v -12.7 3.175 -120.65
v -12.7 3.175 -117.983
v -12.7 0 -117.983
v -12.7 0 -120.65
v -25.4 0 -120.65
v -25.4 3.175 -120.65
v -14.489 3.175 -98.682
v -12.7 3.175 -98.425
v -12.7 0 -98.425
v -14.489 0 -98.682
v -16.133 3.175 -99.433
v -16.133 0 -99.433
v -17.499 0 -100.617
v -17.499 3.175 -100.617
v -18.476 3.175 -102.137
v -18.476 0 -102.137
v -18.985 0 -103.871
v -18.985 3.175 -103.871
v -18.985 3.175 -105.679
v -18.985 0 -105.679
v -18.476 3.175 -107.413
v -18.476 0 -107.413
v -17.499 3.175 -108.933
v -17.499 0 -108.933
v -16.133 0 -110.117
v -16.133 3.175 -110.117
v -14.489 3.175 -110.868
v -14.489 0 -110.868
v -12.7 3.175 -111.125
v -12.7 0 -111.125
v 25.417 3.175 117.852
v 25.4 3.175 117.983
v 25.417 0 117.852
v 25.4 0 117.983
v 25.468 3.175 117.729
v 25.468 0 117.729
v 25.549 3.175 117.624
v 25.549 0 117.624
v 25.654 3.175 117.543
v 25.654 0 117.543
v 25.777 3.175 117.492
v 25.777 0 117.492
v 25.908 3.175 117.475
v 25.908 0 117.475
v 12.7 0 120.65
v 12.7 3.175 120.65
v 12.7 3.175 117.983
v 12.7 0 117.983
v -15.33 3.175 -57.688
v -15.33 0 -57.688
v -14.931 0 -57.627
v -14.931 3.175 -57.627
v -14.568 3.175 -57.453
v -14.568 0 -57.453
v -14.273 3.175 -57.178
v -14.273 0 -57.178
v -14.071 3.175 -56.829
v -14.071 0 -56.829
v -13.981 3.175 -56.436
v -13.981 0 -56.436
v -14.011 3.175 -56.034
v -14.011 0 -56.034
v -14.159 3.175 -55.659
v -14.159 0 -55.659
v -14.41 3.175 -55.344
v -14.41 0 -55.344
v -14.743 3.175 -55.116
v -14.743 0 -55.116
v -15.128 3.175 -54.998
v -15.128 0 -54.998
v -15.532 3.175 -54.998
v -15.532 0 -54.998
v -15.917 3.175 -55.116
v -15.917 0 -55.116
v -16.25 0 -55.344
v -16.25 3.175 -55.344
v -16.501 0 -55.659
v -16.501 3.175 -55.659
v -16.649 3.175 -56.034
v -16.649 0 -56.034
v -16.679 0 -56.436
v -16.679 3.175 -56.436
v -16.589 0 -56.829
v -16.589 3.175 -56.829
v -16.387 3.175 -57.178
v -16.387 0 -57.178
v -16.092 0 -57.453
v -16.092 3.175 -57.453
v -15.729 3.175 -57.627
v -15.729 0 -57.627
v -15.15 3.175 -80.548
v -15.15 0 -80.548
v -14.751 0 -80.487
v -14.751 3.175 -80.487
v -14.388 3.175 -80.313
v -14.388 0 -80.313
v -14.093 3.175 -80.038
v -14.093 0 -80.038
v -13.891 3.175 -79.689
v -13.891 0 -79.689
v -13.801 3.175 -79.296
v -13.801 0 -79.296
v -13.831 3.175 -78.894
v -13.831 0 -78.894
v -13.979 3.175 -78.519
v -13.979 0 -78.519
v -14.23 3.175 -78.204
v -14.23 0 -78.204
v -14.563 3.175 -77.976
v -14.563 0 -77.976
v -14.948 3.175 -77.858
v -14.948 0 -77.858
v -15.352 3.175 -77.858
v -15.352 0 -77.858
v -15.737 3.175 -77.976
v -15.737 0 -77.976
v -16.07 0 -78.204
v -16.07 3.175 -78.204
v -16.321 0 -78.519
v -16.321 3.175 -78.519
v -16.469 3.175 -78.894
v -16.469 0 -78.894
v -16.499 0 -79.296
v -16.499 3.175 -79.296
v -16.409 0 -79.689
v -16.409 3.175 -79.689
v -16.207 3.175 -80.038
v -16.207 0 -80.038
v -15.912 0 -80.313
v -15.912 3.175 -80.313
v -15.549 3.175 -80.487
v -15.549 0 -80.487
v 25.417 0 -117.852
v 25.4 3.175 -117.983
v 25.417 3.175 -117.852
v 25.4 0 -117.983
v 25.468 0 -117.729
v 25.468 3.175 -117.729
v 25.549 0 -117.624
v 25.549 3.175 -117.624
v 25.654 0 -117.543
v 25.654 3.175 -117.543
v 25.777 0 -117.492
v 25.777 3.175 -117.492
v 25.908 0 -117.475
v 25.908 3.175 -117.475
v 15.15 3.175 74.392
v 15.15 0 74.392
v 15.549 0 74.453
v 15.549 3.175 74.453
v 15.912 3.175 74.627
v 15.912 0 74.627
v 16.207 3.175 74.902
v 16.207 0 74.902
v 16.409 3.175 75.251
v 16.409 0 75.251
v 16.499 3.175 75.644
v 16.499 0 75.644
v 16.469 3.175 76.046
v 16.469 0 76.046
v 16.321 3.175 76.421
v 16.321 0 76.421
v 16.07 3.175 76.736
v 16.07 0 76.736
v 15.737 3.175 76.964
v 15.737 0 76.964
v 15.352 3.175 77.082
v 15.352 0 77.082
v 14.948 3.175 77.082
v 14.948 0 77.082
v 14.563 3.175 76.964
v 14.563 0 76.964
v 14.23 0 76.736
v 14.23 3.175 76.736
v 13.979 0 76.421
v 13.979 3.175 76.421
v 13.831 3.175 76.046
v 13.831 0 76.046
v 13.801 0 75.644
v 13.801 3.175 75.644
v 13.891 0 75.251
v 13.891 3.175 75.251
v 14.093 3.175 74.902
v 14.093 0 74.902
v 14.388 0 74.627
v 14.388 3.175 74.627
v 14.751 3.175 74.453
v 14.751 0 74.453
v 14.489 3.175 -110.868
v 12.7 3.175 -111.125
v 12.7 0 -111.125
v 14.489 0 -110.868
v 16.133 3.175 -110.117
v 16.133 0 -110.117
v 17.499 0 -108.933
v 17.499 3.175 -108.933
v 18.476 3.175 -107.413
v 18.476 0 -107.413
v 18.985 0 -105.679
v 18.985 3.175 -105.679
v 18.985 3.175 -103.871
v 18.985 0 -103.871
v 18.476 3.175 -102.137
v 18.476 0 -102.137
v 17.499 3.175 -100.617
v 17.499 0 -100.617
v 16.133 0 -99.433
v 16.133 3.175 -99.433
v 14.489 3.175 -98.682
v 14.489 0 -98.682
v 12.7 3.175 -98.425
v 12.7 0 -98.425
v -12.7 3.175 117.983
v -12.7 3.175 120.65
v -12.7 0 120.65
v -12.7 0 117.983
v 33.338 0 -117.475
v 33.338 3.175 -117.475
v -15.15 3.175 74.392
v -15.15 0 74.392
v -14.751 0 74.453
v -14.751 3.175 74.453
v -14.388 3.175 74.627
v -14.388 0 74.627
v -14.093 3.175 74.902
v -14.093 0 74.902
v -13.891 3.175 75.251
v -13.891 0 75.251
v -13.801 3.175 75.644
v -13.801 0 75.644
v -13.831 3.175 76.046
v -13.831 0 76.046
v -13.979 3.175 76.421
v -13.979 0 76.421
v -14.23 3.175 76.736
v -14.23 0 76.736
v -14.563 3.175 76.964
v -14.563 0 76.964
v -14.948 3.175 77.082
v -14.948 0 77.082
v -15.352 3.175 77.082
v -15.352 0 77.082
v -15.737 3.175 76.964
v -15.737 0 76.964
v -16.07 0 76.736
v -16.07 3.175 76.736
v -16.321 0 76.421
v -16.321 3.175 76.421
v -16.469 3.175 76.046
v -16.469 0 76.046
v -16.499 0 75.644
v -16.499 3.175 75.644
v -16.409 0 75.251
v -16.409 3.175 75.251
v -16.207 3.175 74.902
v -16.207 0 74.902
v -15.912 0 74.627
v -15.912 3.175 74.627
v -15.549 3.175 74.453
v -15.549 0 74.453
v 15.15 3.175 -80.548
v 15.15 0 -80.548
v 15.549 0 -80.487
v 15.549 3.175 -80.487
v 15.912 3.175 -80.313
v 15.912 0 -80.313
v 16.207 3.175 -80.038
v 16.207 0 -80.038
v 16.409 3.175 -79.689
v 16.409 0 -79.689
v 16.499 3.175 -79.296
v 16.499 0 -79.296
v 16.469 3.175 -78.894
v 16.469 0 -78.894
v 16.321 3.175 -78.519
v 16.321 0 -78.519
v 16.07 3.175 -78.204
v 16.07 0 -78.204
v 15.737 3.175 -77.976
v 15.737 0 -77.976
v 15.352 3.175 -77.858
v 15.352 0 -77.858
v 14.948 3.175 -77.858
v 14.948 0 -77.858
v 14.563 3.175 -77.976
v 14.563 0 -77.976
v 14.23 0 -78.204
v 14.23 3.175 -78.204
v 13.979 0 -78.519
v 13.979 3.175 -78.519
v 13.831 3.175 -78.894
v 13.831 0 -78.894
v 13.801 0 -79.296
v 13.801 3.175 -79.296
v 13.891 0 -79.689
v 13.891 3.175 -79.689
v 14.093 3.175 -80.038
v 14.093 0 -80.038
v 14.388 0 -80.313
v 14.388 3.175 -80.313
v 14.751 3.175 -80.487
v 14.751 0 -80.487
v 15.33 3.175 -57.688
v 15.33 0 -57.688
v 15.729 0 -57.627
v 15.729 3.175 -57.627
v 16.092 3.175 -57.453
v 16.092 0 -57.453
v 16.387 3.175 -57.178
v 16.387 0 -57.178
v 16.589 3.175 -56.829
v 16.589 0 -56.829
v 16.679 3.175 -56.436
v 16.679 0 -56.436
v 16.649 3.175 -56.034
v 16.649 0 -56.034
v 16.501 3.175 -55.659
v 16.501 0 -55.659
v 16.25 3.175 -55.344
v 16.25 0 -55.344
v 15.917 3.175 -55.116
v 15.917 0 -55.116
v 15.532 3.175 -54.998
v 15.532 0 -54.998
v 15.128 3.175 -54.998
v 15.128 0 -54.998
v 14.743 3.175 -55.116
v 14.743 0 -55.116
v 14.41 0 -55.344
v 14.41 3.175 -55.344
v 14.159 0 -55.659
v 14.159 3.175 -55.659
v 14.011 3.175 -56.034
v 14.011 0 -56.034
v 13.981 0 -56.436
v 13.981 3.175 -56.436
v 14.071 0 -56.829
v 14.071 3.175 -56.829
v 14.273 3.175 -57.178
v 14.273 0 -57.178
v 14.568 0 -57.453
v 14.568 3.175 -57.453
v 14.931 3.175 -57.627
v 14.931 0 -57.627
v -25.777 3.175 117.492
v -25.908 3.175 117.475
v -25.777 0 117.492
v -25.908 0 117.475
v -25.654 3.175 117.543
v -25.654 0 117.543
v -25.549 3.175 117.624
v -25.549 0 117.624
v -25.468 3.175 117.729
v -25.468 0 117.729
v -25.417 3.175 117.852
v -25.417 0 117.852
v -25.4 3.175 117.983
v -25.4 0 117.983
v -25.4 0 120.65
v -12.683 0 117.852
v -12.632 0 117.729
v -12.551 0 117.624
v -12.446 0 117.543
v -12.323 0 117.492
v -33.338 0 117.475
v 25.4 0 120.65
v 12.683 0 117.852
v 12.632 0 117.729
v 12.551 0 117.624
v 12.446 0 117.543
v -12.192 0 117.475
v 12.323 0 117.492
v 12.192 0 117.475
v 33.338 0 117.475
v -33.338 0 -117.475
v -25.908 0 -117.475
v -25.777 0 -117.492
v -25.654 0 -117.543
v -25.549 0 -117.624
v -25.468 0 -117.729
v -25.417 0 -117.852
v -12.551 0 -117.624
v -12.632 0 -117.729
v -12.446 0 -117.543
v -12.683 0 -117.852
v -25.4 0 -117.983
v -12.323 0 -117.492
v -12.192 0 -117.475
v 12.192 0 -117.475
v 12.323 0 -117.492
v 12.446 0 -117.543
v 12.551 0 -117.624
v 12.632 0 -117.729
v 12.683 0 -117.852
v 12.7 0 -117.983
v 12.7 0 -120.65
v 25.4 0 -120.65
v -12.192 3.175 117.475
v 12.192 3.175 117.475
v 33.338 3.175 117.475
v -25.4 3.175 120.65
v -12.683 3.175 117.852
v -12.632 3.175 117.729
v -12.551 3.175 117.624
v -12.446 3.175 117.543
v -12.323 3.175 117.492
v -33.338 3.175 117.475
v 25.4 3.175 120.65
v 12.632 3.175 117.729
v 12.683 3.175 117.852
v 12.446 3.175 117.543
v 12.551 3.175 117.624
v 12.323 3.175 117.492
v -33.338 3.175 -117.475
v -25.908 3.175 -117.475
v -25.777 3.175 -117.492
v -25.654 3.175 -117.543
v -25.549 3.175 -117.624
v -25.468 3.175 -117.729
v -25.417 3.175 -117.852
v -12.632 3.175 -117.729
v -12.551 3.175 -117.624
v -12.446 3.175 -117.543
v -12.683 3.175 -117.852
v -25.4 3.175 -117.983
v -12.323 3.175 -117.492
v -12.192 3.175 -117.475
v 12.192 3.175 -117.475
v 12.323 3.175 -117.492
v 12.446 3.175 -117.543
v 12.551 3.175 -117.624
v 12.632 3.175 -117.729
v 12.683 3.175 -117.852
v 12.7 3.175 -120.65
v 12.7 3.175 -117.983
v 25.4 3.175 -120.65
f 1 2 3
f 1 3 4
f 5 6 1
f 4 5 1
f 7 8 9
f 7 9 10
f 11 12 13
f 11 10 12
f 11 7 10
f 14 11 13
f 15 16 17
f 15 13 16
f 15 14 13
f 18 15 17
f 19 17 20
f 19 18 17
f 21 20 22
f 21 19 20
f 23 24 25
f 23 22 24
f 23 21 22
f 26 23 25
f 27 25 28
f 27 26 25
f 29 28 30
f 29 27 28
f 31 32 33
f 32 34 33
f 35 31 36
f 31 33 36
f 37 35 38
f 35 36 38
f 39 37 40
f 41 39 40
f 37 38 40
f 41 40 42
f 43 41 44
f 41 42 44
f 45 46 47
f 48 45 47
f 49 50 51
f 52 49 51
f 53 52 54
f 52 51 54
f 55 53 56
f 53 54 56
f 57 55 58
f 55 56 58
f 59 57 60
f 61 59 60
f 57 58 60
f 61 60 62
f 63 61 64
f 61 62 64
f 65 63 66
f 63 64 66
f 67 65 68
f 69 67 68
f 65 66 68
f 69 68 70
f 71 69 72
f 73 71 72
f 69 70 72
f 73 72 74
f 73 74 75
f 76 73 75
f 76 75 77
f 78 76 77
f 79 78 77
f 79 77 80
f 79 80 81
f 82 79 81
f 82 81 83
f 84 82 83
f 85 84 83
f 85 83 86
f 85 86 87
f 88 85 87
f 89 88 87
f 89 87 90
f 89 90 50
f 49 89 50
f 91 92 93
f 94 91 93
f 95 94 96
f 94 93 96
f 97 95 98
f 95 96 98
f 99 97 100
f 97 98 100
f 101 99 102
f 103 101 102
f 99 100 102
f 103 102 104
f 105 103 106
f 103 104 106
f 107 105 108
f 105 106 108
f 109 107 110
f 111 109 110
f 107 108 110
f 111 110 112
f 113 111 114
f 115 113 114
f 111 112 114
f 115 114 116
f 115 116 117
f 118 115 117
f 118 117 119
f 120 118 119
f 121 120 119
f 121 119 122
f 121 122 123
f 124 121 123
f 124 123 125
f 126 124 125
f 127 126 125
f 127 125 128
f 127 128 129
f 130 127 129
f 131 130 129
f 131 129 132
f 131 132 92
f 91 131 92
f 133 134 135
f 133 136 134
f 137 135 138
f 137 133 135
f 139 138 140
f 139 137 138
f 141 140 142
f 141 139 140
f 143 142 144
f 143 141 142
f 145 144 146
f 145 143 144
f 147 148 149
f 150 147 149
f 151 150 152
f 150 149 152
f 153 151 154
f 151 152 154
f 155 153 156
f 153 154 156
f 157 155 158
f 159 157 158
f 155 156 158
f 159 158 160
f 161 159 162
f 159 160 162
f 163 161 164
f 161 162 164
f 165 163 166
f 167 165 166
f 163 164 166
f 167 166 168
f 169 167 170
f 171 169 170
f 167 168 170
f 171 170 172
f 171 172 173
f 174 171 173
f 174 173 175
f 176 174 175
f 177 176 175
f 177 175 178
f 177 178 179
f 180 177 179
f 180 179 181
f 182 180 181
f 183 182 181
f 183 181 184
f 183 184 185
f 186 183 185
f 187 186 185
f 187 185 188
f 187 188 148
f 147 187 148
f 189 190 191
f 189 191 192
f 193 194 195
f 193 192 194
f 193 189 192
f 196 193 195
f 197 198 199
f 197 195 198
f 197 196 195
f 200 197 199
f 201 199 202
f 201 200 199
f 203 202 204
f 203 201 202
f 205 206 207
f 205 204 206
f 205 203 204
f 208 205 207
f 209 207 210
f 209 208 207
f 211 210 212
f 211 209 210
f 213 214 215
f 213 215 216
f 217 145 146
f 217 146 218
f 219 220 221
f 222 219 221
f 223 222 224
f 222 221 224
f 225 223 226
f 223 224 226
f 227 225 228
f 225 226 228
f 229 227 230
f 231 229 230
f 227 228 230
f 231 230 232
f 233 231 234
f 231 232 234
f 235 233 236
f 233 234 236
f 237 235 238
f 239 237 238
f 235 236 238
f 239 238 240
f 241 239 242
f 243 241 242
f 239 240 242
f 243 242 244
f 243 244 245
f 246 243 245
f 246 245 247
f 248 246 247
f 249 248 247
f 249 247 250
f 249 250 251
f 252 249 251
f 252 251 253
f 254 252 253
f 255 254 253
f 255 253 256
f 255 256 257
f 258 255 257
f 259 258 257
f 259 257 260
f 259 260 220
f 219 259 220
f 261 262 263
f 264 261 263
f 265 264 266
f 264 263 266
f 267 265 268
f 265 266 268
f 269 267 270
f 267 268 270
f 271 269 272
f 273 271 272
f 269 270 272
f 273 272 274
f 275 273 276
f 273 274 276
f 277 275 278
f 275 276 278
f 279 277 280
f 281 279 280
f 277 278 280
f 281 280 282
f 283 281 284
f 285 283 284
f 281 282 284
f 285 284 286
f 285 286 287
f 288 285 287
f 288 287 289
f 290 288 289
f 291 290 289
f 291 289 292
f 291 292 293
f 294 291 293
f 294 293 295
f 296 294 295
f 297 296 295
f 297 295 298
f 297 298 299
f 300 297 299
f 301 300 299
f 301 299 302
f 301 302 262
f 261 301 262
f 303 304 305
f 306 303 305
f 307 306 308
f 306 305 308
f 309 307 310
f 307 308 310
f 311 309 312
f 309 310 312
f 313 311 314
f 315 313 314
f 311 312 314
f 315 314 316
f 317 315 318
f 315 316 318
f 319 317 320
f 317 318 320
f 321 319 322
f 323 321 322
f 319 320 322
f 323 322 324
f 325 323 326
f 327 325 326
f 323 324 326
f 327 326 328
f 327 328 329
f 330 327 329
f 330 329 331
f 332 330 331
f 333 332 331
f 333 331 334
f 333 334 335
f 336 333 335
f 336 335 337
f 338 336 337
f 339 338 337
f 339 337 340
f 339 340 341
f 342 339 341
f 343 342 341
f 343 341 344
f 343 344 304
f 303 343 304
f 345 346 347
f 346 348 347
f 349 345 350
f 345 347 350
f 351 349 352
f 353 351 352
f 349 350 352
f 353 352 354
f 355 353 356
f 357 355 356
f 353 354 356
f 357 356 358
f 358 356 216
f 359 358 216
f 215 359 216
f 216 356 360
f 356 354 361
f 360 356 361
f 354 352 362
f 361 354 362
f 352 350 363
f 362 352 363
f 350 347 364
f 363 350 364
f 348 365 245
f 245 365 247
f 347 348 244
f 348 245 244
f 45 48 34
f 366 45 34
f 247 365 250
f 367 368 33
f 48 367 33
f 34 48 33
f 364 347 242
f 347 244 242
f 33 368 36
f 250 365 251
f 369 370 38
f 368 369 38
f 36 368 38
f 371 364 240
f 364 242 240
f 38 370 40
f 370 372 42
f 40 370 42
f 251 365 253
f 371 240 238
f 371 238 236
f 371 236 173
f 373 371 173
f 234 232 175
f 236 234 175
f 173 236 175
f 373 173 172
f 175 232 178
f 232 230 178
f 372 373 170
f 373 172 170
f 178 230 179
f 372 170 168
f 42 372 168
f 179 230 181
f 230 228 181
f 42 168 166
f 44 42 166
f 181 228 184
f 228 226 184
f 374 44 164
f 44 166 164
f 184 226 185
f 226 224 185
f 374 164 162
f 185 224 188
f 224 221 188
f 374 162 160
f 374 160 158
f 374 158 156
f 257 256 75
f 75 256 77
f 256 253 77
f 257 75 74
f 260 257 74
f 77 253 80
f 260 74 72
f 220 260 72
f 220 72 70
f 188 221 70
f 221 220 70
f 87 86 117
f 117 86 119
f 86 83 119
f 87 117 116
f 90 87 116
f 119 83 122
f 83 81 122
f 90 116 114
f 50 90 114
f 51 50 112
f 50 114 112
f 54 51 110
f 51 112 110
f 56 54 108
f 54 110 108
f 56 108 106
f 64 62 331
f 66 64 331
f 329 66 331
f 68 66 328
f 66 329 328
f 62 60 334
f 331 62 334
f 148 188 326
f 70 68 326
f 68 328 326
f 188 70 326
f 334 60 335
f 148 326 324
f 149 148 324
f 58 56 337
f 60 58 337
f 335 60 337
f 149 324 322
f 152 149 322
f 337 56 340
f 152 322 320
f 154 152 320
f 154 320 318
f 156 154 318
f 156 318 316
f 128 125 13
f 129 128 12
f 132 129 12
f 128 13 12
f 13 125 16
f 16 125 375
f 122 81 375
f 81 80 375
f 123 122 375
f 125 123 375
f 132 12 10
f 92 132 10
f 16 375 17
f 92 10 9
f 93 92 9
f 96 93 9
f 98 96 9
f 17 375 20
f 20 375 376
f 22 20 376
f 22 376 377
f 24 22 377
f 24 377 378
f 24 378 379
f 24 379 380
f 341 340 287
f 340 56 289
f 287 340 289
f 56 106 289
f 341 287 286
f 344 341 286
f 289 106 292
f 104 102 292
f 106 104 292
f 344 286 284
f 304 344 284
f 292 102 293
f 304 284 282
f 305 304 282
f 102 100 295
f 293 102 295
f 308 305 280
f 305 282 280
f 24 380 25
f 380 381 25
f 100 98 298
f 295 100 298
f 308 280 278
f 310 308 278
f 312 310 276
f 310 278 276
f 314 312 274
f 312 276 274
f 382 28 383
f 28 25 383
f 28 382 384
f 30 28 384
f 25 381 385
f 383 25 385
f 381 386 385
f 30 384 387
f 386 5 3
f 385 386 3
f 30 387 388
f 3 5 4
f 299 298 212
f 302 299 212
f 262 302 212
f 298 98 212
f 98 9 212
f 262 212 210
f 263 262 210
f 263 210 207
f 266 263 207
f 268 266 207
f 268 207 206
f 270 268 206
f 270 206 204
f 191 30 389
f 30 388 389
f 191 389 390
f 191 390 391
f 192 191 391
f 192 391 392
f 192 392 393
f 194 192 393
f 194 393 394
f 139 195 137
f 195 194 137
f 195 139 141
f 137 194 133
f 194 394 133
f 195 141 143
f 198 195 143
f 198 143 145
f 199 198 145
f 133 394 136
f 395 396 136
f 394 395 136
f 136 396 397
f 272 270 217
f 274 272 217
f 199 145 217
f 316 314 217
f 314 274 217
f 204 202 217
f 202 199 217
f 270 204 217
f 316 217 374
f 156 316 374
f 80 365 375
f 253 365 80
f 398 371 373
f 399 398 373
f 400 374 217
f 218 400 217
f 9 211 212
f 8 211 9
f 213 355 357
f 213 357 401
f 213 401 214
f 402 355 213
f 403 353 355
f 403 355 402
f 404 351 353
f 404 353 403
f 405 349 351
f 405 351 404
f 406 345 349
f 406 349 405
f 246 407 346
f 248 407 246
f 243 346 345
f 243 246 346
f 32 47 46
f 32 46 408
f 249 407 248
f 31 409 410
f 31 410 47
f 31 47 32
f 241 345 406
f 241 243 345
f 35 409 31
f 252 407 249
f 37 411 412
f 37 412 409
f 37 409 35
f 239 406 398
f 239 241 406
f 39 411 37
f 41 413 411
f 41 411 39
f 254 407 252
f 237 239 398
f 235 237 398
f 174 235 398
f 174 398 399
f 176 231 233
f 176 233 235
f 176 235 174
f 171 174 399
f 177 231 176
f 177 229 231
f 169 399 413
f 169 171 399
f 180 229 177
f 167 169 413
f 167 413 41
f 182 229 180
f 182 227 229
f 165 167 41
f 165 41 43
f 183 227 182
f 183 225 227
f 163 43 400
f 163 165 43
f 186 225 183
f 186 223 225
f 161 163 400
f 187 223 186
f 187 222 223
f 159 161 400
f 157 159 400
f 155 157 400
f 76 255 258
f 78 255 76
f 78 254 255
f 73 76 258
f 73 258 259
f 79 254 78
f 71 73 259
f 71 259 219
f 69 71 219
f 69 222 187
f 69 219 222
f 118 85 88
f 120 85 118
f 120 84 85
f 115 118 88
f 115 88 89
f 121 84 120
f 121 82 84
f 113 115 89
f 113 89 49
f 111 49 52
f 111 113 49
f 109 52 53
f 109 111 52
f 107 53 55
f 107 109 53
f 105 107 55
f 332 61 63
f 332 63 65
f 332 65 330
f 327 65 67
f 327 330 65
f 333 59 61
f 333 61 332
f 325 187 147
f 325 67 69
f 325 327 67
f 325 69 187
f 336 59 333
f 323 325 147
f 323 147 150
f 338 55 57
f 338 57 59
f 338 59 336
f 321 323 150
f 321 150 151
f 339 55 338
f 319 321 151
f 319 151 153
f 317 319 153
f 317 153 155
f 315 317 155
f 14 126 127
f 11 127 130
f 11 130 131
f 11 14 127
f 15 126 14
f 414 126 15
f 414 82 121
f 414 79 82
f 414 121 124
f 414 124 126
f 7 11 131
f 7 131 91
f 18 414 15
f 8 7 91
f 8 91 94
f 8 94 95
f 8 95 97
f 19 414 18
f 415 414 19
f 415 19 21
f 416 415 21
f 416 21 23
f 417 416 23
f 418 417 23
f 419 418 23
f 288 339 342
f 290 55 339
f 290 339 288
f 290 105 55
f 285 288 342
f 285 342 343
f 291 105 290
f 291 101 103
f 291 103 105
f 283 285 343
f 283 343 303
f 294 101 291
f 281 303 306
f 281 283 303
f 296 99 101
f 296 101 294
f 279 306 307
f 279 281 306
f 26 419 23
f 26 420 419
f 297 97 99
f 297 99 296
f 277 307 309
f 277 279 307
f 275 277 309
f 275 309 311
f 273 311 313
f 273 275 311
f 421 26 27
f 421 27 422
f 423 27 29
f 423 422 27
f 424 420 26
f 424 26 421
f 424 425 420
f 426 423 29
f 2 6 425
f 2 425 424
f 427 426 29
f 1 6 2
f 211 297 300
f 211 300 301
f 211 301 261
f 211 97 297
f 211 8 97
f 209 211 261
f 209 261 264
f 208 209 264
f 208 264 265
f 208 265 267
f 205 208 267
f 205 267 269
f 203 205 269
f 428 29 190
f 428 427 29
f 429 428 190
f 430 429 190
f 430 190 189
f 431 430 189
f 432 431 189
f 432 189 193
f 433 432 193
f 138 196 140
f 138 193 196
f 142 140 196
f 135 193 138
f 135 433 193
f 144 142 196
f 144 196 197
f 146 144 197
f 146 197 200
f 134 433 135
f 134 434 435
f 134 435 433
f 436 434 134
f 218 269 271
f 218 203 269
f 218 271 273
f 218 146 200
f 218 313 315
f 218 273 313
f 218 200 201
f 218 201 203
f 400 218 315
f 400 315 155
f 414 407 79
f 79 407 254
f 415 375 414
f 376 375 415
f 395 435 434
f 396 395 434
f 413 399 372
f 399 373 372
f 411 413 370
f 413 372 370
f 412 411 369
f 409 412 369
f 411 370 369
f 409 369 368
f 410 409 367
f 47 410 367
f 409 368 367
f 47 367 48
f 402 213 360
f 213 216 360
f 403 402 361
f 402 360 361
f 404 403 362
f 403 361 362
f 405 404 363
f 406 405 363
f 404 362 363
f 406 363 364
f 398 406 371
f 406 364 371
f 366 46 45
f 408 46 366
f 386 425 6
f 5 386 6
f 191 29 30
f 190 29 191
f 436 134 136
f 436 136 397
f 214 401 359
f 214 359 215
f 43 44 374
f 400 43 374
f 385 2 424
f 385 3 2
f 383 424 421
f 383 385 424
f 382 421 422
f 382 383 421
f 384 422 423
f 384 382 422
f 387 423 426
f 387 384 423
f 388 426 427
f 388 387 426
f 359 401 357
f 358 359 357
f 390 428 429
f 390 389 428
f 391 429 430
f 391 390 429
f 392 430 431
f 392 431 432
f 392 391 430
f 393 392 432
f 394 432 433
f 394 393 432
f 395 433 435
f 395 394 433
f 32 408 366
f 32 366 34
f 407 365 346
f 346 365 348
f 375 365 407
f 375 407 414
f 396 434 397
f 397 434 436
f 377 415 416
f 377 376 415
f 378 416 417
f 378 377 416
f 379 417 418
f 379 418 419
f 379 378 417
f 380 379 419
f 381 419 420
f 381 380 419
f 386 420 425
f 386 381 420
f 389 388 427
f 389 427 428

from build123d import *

# Parameters (mm, degrees)
SKETCH1_W             = 66.675
SKETCH1_H             = 234.95
BOSS_EXTRUDE1_DEPTH   = 3.175
SKETCH3_W             = 12.7
SKETCH3_H             = 3.175
BOSS_EXTRUDE2_DEPTH   = 3.175
CUT_EXTRUDE1_DEPTH    = 126.211389383
FILLET1_R             = 0.508
F_6_32_TAPPED_HOLE1_D = 2.7051


with BuildPart() as part:
    # Sketch1 → Boss-Extrude1 (new body)
    with BuildSketch(Plane(origin=(0, 0, 0), x_dir=(1, 0, 0), z_dir=(0, 1, 0))):
        Rectangle(SKETCH1_W, SKETCH1_H)
    extrude(amount=BOSS_EXTRUDE1_DEPTH)

    # Sketch3 → Boss-Extrude2 (add)
    with BuildSketch(Plane(origin=(0, 3.175, 0), x_dir=(1, 0, 0), z_dir=(0, 1, 0))):
        with Locations((-19.05, -119.0625)):
            Rectangle(SKETCH3_W, SKETCH3_H)
        with Locations((19.05, -119.0625)):
            Rectangle(SKETCH3_W, SKETCH3_H)
        with Locations((19.05, 119.0625)):
            Rectangle(SKETCH3_W, SKETCH3_H)
        with Locations((-19.05, 119.0625)):
            Rectangle(SKETCH3_W, SKETCH3_H)
    extrude(amount=-BOSS_EXTRUDE2_DEPTH)

    # Sketch4 → Cut-Extrude1 (cut, through all)
    with BuildSketch(Plane(origin=(0, 3.175, 0), x_dir=(1, 0, 0), z_dir=(0, 1, 0))):
        with BuildLine():
            Line((-12.7, 111.125), (12.7, 111.125))
            ThreePointArc((12.7, 111.125), (19.05, 104.775), (12.7, 98.425))
            Line((12.7, 98.425), (-12.7, 98.425))
            ThreePointArc((-12.7, 98.425), (-19.05, 104.775), (-12.7, 111.125))
        make_face()
    extrude(amount=-CUT_EXTRUDE1_DEPTH, mode=Mode.SUBTRACT)

    # Fillet1
    fillet1_edges = [part.edges().sort_by_distance(p)[0] for p in [
        (25.4, 1.5875, 117.475),
        (12.7, 1.5875, 117.475),
        (-12.7, 1.5875, 117.475),
        (-25.4, 1.5875, 117.475),
        (25.4, 1.5875, -117.475),
        (-12.7, 1.5875, -117.475),
        (-25.4, 1.5875, -117.475),
        (12.7, 1.5875, -117.475),
    ]]
    fillet(fillet1_edges, radius=FILLET1_R)

    # #6-32 Tapped Hole1 (through all)
    with Locations(Plane(origin=(-15.15, 3.175, -79.195), x_dir=(0, 0, 1), z_dir=(0, 1, 0))):
        with Locations((0, 0), (22.86, -0.18), (154.94, 0), (0, 30.3), (22.86, 30.48), (154.94, 30.3)):
            Hole(F_6_32_TAPPED_HOLE1_D / 2)


solid = part.part
